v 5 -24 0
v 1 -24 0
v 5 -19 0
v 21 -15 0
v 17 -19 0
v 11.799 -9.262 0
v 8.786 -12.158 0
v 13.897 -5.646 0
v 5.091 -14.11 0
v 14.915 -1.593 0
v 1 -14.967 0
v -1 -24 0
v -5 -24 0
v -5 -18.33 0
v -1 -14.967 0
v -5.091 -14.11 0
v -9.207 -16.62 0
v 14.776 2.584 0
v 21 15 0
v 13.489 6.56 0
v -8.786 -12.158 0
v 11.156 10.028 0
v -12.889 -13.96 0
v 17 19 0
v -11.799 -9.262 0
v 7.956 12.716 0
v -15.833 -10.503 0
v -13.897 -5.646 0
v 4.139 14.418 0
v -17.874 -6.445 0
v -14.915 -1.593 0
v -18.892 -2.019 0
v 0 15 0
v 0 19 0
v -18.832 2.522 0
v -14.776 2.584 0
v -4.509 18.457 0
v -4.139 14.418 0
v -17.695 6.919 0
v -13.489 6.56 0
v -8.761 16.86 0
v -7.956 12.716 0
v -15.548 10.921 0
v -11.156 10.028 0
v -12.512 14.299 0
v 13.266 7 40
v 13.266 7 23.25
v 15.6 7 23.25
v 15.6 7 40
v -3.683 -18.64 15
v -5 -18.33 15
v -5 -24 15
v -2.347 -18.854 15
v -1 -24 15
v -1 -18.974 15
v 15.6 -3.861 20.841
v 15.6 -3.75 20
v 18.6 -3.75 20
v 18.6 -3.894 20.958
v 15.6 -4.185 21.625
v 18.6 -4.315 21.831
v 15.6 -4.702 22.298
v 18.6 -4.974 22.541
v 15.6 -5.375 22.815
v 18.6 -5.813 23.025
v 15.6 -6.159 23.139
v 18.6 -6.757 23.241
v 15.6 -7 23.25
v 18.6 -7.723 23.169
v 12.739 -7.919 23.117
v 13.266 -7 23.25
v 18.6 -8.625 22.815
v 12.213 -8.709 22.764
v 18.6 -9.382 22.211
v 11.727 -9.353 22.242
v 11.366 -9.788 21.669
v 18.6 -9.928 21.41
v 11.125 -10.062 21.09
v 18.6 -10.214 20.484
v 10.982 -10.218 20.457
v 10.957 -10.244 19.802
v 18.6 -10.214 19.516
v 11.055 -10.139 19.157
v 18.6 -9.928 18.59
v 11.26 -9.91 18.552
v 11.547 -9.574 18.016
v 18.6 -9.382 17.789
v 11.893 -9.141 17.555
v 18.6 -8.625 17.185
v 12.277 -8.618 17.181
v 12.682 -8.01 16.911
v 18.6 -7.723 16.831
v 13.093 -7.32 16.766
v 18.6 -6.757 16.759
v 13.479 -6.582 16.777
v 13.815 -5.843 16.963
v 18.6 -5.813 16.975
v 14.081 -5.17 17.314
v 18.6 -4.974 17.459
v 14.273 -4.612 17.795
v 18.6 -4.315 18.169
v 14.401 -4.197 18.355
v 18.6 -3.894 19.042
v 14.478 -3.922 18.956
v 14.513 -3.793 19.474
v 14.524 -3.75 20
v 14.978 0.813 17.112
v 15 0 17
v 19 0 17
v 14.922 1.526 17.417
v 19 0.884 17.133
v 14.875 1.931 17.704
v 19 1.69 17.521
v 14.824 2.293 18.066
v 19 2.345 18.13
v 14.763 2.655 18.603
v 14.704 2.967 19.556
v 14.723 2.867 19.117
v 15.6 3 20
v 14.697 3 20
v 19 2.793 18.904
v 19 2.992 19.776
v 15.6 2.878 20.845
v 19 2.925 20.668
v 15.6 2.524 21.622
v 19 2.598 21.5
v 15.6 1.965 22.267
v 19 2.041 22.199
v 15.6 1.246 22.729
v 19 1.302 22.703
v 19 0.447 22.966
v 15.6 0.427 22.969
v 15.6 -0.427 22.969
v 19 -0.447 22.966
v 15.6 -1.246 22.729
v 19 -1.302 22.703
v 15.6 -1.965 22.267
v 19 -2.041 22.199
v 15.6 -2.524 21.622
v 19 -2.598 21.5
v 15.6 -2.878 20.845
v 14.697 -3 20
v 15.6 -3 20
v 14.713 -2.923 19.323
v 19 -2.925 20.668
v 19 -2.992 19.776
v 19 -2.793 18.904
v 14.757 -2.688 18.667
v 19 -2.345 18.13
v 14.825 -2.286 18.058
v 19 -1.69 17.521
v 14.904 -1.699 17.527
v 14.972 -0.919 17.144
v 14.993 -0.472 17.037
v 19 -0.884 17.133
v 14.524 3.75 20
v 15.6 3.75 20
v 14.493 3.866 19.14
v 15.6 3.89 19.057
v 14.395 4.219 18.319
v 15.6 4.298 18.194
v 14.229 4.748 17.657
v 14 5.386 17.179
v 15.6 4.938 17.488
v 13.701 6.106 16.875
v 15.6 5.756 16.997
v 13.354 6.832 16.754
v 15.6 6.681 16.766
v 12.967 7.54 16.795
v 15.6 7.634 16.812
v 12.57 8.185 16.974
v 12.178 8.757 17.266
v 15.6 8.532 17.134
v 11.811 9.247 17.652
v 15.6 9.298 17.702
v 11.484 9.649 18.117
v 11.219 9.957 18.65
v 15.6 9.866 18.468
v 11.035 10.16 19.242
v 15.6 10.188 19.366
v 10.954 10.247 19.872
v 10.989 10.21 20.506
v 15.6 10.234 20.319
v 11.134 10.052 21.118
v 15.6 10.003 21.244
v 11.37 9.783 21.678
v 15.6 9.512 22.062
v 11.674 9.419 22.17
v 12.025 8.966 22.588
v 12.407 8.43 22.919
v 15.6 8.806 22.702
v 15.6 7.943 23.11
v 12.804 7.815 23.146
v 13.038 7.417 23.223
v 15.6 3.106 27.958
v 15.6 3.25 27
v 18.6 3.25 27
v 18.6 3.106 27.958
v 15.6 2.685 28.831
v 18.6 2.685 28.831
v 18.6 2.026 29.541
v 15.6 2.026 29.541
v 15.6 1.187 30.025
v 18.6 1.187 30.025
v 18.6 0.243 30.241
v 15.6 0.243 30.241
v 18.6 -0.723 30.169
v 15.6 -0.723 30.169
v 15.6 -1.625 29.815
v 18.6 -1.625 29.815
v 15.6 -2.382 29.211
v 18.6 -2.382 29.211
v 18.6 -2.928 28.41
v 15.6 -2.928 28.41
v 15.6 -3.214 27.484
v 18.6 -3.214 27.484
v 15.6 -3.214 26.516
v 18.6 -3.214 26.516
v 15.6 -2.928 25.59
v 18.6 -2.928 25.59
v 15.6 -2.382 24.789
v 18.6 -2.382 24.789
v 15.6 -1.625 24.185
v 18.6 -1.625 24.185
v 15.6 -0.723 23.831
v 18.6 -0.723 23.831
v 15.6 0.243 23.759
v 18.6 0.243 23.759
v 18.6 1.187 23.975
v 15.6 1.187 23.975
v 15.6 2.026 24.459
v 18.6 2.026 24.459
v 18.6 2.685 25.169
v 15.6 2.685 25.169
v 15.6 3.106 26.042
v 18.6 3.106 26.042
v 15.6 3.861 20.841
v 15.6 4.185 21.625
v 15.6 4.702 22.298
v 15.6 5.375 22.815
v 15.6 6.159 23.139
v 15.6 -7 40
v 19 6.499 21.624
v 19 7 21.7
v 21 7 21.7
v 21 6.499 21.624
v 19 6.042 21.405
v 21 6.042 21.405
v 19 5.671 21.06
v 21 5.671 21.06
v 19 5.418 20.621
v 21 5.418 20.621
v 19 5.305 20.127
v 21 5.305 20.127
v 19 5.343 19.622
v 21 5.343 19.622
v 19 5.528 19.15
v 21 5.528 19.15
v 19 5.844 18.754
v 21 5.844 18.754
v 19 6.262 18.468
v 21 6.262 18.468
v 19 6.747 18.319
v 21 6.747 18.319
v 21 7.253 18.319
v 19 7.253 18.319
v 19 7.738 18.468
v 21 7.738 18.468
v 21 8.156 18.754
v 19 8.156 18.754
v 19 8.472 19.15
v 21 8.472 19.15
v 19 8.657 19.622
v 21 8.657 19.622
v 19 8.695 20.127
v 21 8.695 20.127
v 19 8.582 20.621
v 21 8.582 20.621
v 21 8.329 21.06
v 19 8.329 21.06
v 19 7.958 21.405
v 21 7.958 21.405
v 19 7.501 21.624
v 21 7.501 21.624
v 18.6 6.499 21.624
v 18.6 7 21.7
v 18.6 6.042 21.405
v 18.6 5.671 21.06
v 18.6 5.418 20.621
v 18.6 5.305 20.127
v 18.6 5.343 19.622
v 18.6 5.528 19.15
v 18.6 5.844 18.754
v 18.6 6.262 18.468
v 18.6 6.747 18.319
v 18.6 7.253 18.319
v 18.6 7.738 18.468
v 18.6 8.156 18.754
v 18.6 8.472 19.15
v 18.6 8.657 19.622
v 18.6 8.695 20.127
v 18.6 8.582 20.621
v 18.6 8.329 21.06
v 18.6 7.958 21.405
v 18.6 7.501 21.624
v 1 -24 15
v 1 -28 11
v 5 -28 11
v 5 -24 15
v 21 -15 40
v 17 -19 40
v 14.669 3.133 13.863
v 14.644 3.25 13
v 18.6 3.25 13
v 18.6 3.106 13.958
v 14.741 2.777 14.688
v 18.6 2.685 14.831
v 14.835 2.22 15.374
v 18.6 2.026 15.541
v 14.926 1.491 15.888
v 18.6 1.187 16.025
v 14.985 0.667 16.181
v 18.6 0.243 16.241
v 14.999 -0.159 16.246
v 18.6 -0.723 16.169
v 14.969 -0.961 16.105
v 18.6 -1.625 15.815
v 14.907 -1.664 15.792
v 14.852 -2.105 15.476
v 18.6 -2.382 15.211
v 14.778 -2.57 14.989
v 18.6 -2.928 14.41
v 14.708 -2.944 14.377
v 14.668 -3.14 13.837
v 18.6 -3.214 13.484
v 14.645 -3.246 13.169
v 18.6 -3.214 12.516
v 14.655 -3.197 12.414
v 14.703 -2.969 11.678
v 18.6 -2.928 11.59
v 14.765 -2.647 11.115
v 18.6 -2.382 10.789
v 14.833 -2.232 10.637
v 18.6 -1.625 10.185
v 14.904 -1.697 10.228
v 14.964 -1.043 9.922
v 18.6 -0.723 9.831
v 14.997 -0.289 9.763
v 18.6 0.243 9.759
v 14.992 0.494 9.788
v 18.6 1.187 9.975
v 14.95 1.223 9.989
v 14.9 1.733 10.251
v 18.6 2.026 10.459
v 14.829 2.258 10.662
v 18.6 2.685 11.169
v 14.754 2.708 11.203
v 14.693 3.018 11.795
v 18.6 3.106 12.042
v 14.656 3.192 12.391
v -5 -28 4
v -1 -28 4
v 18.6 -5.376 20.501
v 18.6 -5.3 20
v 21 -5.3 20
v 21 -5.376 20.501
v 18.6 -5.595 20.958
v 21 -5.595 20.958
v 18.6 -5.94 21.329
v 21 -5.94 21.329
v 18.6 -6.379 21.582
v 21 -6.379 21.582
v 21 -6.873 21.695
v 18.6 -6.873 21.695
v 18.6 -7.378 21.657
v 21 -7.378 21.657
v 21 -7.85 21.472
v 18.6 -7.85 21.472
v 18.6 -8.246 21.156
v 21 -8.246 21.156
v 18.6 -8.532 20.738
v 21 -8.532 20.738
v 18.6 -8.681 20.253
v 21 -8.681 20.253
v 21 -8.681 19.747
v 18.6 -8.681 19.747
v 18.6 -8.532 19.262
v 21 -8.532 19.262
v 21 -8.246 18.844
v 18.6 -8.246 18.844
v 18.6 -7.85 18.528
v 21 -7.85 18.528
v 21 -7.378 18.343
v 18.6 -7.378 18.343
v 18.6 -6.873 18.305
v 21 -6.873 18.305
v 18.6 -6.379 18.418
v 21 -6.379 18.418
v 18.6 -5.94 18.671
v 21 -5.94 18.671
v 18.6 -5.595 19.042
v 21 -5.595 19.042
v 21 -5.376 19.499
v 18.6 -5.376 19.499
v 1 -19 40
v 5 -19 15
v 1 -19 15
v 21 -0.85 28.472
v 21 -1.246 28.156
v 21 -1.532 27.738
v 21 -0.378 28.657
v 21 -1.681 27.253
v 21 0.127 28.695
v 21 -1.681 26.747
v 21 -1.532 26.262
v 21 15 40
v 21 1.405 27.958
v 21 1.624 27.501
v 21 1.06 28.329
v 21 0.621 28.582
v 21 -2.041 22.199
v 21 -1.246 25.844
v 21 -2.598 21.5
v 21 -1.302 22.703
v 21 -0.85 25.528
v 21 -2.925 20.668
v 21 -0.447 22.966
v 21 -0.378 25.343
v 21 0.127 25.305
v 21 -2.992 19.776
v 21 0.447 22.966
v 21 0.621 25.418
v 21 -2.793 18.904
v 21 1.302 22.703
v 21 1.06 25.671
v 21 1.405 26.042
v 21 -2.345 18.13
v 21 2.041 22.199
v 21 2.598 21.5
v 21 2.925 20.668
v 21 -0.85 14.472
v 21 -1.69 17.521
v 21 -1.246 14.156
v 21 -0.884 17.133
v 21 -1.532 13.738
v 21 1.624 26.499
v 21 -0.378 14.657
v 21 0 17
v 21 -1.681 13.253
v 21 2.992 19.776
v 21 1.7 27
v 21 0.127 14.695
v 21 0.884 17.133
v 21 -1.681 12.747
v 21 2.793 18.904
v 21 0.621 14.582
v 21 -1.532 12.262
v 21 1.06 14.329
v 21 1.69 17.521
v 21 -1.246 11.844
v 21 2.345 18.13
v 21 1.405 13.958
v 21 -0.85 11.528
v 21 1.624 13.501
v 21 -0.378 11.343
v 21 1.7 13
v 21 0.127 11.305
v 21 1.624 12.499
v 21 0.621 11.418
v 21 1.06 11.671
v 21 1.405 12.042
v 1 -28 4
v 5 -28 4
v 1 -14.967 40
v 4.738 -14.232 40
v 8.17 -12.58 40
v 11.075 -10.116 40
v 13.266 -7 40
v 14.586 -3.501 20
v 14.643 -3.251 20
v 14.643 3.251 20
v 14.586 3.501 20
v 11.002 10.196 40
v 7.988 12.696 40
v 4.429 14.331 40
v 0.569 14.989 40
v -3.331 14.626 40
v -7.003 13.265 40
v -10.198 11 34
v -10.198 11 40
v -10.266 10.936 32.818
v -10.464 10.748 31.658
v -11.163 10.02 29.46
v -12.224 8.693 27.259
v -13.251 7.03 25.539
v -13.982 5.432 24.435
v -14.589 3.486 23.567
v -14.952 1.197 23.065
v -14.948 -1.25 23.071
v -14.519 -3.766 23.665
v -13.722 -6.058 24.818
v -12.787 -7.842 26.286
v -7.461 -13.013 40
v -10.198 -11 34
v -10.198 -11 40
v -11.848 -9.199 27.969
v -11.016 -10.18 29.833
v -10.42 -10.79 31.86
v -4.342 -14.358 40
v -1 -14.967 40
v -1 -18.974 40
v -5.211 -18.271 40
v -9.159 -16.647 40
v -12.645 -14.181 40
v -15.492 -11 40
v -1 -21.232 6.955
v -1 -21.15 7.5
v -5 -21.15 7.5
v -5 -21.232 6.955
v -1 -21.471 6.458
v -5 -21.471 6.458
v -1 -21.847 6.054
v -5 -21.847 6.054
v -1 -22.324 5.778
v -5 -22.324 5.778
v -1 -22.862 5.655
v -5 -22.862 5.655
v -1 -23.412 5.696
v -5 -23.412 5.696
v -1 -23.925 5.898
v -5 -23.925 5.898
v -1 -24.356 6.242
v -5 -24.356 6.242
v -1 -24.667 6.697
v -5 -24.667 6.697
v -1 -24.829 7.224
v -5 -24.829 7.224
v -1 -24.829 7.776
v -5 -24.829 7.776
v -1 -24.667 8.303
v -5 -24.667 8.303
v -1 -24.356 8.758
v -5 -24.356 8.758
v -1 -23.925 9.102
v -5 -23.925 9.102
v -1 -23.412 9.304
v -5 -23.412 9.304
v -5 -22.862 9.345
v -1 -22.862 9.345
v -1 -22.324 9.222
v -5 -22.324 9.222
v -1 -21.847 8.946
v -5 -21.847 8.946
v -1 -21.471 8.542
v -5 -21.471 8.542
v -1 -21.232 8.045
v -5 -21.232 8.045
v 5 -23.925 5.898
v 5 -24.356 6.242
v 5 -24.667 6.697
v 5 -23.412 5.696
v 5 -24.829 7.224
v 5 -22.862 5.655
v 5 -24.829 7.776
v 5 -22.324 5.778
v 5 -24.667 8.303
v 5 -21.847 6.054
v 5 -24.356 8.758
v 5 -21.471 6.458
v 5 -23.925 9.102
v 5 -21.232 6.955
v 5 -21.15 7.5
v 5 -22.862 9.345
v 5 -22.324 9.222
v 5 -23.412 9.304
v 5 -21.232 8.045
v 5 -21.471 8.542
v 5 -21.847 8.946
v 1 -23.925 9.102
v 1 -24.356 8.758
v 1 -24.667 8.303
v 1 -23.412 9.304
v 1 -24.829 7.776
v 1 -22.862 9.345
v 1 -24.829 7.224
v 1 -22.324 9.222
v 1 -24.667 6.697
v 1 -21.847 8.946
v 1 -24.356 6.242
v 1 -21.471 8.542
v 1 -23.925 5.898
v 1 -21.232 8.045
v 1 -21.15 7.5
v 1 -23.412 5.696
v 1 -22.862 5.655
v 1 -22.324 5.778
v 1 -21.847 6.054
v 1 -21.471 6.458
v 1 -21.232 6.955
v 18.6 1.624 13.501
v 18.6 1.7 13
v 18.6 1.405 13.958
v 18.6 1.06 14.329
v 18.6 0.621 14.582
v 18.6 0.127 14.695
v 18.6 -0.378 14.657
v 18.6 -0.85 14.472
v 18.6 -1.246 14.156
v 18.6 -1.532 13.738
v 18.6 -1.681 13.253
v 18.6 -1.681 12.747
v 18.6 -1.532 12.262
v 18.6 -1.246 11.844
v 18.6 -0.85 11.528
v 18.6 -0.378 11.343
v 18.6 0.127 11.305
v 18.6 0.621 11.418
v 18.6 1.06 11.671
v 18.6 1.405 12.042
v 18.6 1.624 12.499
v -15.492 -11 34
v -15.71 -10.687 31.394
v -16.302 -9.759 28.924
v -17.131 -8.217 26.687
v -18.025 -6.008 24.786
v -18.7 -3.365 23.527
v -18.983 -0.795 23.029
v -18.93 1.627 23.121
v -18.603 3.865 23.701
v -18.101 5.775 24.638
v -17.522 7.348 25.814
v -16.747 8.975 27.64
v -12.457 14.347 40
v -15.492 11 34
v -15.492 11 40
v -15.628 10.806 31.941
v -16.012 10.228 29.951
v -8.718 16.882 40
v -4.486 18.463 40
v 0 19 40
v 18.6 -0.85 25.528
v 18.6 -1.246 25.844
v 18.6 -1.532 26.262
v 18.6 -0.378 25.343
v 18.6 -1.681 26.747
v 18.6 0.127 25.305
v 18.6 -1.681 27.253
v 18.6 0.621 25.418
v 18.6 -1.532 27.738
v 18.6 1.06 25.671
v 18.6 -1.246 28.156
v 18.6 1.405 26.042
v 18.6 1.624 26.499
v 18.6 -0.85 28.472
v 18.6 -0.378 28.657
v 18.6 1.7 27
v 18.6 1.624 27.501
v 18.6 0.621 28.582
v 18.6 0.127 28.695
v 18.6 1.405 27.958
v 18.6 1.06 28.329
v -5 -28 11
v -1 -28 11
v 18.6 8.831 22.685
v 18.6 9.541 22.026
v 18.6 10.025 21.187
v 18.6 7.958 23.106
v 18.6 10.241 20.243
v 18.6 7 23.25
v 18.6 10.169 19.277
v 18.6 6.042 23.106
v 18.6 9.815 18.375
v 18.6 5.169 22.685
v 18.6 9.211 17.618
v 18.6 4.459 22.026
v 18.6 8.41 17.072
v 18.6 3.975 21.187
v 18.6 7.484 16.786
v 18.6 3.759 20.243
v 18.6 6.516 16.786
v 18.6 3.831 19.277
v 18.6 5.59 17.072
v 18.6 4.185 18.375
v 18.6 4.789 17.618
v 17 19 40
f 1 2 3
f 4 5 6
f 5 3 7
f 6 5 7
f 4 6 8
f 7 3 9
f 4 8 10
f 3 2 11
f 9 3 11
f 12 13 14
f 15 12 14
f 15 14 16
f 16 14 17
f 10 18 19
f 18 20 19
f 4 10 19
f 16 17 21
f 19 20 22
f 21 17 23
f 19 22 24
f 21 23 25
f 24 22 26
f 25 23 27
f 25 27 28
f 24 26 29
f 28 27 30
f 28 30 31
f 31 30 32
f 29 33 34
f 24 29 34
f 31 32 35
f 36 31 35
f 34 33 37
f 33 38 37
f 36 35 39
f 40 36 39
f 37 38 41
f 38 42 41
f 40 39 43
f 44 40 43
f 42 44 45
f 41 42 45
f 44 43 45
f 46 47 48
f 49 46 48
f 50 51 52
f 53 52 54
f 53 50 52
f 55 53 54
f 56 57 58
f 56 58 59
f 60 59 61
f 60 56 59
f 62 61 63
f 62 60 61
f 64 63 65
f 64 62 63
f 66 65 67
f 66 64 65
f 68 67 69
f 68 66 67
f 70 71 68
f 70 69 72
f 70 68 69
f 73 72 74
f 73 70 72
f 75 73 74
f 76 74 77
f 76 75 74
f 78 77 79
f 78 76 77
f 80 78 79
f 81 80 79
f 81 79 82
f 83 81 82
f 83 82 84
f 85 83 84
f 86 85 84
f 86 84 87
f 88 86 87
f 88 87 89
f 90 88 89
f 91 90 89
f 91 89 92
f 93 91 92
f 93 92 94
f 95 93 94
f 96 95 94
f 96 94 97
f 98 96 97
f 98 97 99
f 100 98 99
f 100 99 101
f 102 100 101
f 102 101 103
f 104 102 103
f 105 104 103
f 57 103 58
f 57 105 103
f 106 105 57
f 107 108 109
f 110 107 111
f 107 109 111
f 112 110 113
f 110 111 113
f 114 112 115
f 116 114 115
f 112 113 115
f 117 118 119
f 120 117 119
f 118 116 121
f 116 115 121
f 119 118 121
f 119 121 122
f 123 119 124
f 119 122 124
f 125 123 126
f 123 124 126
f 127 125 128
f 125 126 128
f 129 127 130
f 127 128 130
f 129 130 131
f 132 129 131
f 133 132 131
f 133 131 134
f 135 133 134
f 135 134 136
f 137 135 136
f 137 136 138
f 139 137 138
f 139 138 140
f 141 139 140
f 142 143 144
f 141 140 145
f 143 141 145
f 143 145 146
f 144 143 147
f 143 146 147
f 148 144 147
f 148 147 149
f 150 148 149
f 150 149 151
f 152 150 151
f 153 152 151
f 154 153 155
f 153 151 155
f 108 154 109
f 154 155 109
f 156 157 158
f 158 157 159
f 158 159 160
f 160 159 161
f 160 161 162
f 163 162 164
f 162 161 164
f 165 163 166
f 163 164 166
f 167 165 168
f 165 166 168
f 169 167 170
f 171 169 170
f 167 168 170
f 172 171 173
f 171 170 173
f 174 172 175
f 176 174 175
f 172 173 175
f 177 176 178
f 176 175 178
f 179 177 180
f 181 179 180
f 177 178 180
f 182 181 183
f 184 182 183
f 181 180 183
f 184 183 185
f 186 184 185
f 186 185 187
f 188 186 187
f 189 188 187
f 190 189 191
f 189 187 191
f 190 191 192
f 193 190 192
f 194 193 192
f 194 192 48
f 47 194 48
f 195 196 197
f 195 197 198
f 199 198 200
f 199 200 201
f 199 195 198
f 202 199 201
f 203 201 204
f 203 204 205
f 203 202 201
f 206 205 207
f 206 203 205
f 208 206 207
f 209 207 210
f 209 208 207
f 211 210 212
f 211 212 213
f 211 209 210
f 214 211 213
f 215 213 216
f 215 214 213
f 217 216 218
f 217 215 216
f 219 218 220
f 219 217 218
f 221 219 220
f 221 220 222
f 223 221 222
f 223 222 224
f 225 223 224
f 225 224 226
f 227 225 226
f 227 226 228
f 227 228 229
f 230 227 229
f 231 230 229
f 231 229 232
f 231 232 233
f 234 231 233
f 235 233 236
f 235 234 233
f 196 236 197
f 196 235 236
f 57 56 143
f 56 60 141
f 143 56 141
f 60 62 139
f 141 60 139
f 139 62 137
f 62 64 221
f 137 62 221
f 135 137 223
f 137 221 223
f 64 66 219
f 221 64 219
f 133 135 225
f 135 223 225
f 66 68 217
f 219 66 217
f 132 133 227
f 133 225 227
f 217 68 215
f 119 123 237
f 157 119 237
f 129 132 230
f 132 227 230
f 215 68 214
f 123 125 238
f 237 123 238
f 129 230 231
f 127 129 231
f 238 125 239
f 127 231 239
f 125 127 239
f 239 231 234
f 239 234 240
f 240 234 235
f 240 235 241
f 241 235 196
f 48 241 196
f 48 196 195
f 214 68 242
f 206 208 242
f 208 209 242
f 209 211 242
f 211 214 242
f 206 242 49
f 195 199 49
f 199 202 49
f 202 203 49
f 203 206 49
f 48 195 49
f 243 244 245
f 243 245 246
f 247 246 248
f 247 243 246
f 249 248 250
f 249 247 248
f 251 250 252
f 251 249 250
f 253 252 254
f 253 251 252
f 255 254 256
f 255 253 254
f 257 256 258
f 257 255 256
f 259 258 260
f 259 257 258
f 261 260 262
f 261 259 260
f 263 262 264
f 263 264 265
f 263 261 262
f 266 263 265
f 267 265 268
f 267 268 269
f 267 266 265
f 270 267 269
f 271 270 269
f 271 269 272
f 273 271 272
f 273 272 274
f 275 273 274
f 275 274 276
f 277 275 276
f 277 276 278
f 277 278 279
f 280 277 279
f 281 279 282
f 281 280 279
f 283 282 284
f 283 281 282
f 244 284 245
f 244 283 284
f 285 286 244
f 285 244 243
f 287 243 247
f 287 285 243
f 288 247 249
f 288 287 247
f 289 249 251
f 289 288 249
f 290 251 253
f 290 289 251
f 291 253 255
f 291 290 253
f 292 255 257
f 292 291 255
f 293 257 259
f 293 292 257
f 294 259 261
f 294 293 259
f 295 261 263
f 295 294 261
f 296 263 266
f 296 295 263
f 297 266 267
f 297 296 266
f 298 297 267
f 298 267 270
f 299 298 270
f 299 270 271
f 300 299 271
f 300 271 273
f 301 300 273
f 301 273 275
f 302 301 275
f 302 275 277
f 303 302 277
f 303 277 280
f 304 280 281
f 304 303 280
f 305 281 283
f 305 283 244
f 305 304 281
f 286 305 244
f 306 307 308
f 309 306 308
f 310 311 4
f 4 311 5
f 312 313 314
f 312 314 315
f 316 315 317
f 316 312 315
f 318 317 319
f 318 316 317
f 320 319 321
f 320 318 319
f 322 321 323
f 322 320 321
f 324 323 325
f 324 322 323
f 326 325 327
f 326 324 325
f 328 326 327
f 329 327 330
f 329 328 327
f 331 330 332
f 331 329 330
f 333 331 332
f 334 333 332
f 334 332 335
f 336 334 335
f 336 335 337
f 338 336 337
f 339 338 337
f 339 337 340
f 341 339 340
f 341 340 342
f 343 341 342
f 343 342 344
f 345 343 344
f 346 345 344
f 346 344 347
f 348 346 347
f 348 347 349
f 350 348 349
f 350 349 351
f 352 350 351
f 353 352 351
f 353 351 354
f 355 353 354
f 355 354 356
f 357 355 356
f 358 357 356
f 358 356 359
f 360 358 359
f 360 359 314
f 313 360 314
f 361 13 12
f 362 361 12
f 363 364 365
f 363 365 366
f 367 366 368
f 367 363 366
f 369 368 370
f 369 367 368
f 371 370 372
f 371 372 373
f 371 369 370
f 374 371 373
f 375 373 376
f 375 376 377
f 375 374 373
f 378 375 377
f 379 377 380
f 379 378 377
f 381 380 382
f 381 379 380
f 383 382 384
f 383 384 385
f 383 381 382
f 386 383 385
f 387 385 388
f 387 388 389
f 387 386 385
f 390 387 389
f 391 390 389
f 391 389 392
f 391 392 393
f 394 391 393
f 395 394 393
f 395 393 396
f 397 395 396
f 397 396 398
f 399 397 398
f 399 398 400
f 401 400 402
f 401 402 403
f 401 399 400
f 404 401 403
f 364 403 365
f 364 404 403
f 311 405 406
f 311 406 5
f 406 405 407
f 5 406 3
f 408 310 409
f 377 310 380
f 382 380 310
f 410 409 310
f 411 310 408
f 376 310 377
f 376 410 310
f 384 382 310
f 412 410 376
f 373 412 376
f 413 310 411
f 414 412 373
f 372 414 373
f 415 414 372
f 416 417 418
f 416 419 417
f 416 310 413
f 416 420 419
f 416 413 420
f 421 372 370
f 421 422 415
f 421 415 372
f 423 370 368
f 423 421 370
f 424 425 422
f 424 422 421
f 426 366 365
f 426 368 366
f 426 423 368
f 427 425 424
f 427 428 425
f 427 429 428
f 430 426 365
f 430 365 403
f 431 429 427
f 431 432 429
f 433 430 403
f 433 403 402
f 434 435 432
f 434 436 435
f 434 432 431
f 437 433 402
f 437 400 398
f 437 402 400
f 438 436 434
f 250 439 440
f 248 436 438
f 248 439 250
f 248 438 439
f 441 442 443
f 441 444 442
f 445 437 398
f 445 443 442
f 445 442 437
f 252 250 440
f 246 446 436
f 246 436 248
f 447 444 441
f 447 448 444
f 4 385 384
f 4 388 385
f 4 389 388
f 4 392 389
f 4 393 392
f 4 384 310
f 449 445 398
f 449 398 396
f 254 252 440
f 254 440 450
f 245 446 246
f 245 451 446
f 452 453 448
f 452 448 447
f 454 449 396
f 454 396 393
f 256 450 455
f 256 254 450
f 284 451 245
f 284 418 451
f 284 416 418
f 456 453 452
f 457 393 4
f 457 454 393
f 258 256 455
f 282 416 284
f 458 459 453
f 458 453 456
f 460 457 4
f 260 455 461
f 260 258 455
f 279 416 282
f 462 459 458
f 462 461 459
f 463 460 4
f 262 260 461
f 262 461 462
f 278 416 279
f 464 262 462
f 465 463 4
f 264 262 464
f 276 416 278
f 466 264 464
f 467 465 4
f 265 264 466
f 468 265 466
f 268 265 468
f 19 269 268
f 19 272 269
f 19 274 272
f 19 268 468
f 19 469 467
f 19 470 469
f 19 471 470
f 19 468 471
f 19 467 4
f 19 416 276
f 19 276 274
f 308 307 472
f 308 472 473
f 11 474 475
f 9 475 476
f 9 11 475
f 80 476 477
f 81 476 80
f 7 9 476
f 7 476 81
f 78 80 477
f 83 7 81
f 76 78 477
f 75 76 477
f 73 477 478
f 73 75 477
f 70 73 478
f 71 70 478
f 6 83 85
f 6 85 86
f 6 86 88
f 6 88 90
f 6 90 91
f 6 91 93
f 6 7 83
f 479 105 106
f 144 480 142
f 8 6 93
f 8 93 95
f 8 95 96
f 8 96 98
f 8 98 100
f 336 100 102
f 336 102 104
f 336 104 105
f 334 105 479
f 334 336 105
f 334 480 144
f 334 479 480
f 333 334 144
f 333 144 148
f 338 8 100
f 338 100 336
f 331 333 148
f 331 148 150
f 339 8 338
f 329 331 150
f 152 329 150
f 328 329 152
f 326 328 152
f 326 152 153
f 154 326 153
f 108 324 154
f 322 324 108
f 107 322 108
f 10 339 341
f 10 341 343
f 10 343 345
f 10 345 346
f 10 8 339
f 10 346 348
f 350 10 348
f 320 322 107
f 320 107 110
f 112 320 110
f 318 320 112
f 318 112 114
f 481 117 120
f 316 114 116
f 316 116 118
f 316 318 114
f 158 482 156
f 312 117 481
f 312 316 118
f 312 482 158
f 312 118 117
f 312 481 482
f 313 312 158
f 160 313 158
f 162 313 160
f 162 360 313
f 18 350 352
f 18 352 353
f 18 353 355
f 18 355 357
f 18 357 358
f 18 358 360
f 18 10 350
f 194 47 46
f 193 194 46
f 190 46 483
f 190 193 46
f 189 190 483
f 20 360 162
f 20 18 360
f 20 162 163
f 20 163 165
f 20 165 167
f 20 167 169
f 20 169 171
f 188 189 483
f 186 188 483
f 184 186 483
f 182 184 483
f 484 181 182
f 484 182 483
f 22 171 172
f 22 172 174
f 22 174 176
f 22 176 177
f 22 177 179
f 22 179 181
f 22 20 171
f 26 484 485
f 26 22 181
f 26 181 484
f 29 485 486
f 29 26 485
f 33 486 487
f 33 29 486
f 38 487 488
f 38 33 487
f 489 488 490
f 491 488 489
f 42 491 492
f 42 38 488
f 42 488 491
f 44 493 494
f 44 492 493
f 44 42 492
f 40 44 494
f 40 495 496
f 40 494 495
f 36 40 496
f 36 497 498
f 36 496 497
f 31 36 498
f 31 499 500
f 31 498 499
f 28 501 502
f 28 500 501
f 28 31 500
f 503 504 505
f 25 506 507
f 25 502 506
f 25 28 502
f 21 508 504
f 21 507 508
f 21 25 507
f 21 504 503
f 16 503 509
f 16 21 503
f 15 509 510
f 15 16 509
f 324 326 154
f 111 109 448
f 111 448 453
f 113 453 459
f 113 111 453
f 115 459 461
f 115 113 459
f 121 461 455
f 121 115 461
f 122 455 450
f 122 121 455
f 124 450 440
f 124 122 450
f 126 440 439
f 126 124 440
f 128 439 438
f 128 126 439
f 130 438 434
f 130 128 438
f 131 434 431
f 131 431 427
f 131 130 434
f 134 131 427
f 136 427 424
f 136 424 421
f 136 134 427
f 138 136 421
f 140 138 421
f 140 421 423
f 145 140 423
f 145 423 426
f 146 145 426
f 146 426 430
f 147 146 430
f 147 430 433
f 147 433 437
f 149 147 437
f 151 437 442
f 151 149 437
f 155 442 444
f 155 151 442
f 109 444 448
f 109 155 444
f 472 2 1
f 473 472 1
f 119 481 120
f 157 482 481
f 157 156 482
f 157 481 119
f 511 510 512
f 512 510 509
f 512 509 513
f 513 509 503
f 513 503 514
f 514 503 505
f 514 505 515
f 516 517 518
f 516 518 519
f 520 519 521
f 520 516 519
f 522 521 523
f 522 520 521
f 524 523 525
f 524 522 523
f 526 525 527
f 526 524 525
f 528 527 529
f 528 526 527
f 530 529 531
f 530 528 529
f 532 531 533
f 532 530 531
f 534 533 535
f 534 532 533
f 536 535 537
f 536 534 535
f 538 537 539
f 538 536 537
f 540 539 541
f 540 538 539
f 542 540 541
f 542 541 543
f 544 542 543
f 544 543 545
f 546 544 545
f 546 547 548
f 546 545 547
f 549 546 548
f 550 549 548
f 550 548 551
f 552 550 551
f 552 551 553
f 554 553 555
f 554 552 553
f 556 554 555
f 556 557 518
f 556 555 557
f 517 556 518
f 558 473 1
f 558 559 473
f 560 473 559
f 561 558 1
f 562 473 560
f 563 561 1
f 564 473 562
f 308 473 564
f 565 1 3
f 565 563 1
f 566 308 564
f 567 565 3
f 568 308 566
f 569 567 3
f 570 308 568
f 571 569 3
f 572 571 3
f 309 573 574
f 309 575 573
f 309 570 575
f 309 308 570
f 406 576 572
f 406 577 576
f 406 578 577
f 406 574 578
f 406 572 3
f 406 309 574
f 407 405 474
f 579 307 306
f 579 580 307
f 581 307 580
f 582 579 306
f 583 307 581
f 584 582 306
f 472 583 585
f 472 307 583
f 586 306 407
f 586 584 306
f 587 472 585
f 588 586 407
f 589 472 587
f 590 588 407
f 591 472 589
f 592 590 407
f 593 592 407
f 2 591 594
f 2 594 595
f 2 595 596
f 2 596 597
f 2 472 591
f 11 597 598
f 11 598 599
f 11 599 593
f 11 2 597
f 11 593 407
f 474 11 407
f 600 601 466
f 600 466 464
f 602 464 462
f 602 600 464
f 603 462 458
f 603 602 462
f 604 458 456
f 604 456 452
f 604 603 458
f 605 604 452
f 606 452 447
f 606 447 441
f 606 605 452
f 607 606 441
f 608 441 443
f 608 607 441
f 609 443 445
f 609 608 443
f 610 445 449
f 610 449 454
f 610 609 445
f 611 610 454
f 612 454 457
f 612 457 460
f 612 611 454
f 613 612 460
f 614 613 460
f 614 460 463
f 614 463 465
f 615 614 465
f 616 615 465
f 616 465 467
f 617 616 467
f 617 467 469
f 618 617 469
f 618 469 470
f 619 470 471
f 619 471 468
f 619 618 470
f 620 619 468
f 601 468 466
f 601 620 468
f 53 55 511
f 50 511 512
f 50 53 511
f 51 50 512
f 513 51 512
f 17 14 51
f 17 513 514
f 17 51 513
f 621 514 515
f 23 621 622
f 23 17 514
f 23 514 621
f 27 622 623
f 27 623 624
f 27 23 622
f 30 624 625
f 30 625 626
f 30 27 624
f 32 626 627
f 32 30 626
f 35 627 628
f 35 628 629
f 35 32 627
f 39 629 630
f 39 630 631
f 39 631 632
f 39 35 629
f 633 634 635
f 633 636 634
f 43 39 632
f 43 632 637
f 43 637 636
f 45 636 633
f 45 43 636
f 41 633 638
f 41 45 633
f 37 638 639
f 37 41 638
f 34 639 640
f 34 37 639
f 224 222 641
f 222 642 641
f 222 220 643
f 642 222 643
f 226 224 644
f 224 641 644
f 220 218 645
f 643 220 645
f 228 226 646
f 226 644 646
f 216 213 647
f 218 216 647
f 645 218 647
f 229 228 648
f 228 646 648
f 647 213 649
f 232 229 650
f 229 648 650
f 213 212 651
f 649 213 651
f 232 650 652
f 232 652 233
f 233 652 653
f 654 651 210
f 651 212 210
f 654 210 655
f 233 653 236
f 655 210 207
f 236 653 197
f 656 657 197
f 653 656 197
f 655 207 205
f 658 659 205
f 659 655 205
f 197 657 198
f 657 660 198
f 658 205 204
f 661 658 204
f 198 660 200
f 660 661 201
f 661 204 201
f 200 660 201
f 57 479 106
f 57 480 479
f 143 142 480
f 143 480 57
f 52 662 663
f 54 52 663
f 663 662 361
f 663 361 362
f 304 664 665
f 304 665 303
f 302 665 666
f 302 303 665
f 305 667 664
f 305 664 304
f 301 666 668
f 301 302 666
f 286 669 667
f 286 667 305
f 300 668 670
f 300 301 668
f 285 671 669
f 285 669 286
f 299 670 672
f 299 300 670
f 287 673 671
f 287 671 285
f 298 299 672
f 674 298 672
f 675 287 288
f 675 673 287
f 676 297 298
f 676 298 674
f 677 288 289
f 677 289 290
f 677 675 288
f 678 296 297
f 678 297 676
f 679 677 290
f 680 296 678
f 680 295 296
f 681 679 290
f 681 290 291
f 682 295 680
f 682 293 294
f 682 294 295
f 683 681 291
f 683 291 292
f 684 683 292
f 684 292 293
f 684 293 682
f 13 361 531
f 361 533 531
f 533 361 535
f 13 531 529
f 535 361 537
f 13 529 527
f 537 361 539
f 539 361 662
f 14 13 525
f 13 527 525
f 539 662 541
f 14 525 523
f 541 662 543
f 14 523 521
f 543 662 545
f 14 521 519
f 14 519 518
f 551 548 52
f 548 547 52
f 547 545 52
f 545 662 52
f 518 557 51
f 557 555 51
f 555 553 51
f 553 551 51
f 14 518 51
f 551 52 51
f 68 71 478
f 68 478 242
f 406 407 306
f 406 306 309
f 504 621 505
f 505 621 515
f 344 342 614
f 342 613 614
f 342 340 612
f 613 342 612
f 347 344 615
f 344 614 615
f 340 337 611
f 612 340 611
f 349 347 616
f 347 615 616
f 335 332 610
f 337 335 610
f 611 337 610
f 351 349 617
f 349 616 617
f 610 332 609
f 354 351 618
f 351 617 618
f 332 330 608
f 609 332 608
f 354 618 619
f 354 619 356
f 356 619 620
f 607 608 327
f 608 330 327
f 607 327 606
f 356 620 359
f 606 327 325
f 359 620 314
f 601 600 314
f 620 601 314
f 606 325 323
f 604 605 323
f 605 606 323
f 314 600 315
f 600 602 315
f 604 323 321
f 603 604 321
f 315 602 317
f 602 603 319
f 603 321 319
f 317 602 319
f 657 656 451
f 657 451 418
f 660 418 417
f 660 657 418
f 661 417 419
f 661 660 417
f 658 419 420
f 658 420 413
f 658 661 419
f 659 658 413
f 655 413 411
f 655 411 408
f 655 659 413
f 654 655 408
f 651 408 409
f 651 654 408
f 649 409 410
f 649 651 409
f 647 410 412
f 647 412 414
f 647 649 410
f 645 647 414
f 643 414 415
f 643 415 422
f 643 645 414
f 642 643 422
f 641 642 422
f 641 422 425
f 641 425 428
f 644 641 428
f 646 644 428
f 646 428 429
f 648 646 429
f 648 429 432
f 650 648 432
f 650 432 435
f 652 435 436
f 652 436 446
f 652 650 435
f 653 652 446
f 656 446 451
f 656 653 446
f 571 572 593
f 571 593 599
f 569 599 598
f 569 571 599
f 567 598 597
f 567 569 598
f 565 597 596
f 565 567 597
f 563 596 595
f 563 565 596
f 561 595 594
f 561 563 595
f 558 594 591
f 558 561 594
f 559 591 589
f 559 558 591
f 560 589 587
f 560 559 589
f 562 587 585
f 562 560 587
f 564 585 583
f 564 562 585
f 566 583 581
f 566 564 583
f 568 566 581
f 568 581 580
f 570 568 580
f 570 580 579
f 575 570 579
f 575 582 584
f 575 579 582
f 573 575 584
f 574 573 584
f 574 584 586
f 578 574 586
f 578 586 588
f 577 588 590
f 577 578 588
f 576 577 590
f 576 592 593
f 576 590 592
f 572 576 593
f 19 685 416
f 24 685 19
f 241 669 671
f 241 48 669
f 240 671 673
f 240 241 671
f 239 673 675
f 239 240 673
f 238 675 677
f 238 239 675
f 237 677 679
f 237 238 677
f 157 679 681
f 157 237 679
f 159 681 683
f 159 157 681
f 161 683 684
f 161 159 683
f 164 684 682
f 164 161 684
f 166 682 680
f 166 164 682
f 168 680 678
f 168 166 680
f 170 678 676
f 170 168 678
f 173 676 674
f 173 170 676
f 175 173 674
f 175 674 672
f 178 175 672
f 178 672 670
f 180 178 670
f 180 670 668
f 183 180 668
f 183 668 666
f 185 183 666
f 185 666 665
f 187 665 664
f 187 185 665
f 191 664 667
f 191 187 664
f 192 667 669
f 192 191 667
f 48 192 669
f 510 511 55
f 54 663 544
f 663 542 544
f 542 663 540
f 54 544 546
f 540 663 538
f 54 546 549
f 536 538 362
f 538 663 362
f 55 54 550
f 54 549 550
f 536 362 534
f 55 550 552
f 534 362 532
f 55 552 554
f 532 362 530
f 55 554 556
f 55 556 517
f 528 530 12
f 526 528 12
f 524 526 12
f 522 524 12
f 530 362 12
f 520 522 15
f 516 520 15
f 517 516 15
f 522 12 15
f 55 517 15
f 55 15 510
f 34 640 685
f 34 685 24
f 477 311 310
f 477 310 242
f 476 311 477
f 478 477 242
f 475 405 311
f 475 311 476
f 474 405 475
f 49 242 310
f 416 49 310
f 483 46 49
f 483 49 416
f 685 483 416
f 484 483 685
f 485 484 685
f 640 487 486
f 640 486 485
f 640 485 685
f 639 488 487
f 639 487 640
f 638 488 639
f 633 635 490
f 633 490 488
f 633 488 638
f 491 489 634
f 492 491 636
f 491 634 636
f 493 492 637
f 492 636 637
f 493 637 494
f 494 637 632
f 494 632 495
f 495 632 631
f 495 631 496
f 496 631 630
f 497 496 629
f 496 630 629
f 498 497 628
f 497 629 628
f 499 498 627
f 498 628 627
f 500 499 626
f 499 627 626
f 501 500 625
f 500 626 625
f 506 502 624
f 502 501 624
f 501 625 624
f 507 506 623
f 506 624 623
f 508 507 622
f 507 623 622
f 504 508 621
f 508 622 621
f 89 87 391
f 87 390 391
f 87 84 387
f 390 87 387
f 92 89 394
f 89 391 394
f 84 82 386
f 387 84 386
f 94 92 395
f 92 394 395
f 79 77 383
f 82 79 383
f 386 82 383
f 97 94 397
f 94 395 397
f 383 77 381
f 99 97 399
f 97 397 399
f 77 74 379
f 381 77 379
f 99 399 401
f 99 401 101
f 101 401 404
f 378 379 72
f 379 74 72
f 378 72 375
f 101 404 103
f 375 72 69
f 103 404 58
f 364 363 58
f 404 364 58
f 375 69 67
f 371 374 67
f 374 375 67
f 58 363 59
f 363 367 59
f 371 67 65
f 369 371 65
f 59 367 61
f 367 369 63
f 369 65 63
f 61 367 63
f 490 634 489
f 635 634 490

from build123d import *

# Parameters (mm, degrees)
BOSS_EXTRUDE1_DEPTH      = 40
EXTRUDE_START            = -25
SKETCH_5_W               = 10
SKETCH_5_H               = 28
EXTRUDE_2_DEPTH          = 15
CUT_EXTRUDE1_DEPTH       = 53.39274759
CUT_EXTRUDE1_DEPTH_BACK  = 53.39274759
SKETCH2_R                = 15
SKETCH5_R                = 11
CUT_EXTRUDE3_DEPTH       = 10
SKETCH7_W                = 6.152946469
SKETCH7_H                = 22
CUT_EXTRUDE9_DEPTH       = 10
SKETCH_2_W               = 5
SKETCH_2_H               = 14
CUT_EXTRUDE_2_DEPTH      = 20
CUT_EXTRUDE_6_DEPTH      = 51.368641203
CUT_EXTRUDE_6_DEPTH_BACK = 51.368641203
SKETCH_7_R               = 1.85
SKETCH6_W                = 2
SKETCH6_H                = 28
CUT_EXTRUDE8_DEPTH       = 53.392747702
CUT_EXTRUDE10_REACH      = 63.871
SKETCH8_R                = 3
CUT_EXTRUDE11_REACH      = 61.843
SKETCH13_R               = 3.25
SKETCH14_W               = 40
SKETCH14_H               = 38
SKETCH14_R               = 3
SKETCH14_R_2             = 1.7
BOSS_EXTRUDE2_DEPTH      = 2
CIRPATTERN1_START        = 10
CIRPATTERN1_OUTLINE_R    = 3.25
CIRPATTERN1_DEPTH        = 8.6
CIRPATTERN1_START_2      = 18.6
CIRPATTERN1_2_OUTLINE_R  = 1.7
CIRPATTERN1_2_DEPTH      = 2.4
CIRPATTERN2_START        = 15.6
CIRPATTERN2_OUTLINE_R    = 3.25
CIRPATTERN2_DEPTH        = 3
CIRPATTERN2_START_2      = 18.6
CIRPATTERN2_2_OUTLINE_R  = 1.7
CIRPATTERN2_2_DEPTH      = 2.4
CHAMFER1_SIZE            = 4


with BuildPart() as part:
    # Sketch1 → Boss-Extrude1 (new body)
    with BuildSketch(Plane.XY):
        with BuildLine():
            Line((0, 19), (19, 19))
            Line((19, 19), (19, -19))
            Line((19, -19), (0, -19))
            ThreePointArc((0, -19), (-19, 0), (0, 19))
        make_face()
    extrude(amount=BOSS_EXTRUDE1_DEPTH)

    # 草圖5 → 填料-伸長2 (add)
    with BuildSketch(Plane.XY.offset(40).offset(EXTRUDE_START)):
        with Locations((0, -14)):
            Rectangle(SKETCH_5_W, SKETCH_5_H)
    extrude(amount=-EXTRUDE_2_DEPTH)

    # Sketch2 → Cut-Extrude1 (cut, two sides: drawn at the far end of the back side and taken through both)
    with BuildSketch(Plane.XY.offset(40).offset(-CUT_EXTRUDE1_DEPTH_BACK)):
        Circle(SKETCH2_R)
    extrude(amount=CUT_EXTRUDE1_DEPTH + CUT_EXTRUDE1_DEPTH_BACK, mode=Mode.SUBTRACT)

    # Sketch5 → Cut-Extrude3 (cut)
    with BuildSketch(Plane(origin=(-19, 0, 0), x_dir=(0, 1, 0), z_dir=(-1, 0, 0))):
        with Locations((0, -34)):
            Circle(SKETCH5_R)
    extrude(amount=-CUT_EXTRUDE3_DEPTH, mode=Mode.SUBTRACT)

    # Sketch7 → Cut-Extrude9 (cut)
    with BuildSketch(Plane.ZY.offset(19)):
        with Locations((37.076473234, 0)):
            Rectangle(SKETCH7_W, SKETCH7_H)
    extrude(amount=-CUT_EXTRUDE9_DEPTH, mode=Mode.SUBTRACT)

    # 草圖2 → 除料-伸長2 (cut)
    with BuildSketch(Plane.XY.offset(40)):
        with Locations((13.1, 0)):
            Rectangle(SKETCH_2_W, SKETCH_2_H)
    extrude(amount=-CUT_EXTRUDE_2_DEPTH, mode=Mode.SUBTRACT)

    # 草圖7 → 除料-伸長6 (cut, two sides: drawn at the far end of the back side and taken through both)
    with BuildSketch(Plane(origin=(0, -5, 0), x_dir=(0, 0, 1), z_dir=(-1, 0, 0)).offset(-CUT_EXTRUDE_6_DEPTH_BACK)):
        with Locations(Location((7.5, -18, 0), (0, 0, 90))):
            Circle(SKETCH_7_R)
    extrude(amount=CUT_EXTRUDE_6_DEPTH + CUT_EXTRUDE_6_DEPTH_BACK, mode=Mode.SUBTRACT)

    # Sketch6 → Cut-Extrude8 (cut, through all)
    with BuildSketch(Plane.XY):
        with Locations((0, -14)):
            Rectangle(SKETCH6_W, SKETCH6_H)
    extrude(amount=CUT_EXTRUDE8_DEPTH, mode=Mode.SUBTRACT)

    # Sketch8 → Cut-Extrude10 (cut, up to next)
    with BuildSketch(Plane(origin=(19, 0, 0), x_dir=(0, 0, -1), z_dir=(1, 0, 0)), mode=Mode.PRIVATE) as cut_extrude10_sk1:
        with Locations((-20, 0)):
            Circle(SKETCH8_R)
    cut_extrude10_tool1 = extrude(cut_extrude10_sk1.sketch, amount=-CUT_EXTRUDE10_REACH, mode=Mode.PRIVATE) & part.part
    add(cut_extrude10_tool1.solids().sort_by_distance((19, 0, 20))[0], mode=Mode.SUBTRACT)

    # Sketch12 → CBORE for M3 SHCS1 (revolve, cut)
    with BuildSketch(Plane(origin=(15.6, 7, 20), x_dir=(0, 0, 1), z_dir=(0, 1, 0))):
        Polygon((0, 0), (0, 3.4), (1.7, 3.4), (1.7, 3), (3.25, 3), (3.25, 0), align=None)
    revolve(axis=Axis((9.25, 7, 20), (1, 0, 0)), mode=Mode.SUBTRACT)

    # Sketch13 → Cut-Extrude11 (cut, up to next)
    with BuildSketch(Plane(origin=(15.6, 0, 0), x_dir=(0, 0, -1), z_dir=(1, 0, 0)), mode=Mode.PRIVATE) as cut_extrude11_sk1:
        with Locations(Location((-20, 7, 0), (0, 0, 180))):
            Circle(SKETCH13_R)
    cut_extrude11_tool1 = extrude(cut_extrude11_sk1.sketch, amount=-CUT_EXTRUDE11_REACH, mode=Mode.PRIVATE) & part.part
    add(cut_extrude11_tool1.solids().sort_by_distance((15.6, 7, 20))[0], mode=Mode.SUBTRACT)

    # Sketch14 → Boss-Extrude2 (add)
    with BuildSketch(Plane(origin=(19, 0, 0), x_dir=(0, 0, -1), z_dir=(1, 0, 0))):
        with Locations((-20, 0)):
            Rectangle(SKETCH14_W, SKETCH14_H)
        with Locations((-20, 0)):
            Circle(SKETCH14_R, mode=Mode.SUBTRACT)
        with Locations(Location((-20, 7, 0), (0, 0, 180))):
            Circle(SKETCH14_R_2, mode=Mode.SUBTRACT)
    extrude(amount=BOSS_EXTRUDE2_DEPTH)

    # CirPattern1: read off the stored shape, not the designer's step
    # CirPattern1 outline → CirPattern1 (cut)
    with BuildSketch(Plane.YZ.offset(CIRPATTERN1_START)):
        with Locations((0, 13)):
            Circle(CIRPATTERN1_OUTLINE_R)
        with Locations((-7, 20)):
            Circle(CIRPATTERN1_OUTLINE_R)
    extrude(amount=CIRPATTERN1_DEPTH, mode=Mode.SUBTRACT)

    # CirPattern1 2 outline → CirPattern1 2 (cut)
    with BuildSketch(Plane.YZ.offset(CIRPATTERN1_START_2)):
        with Locations((0, 13)):
            Circle(CIRPATTERN1_2_OUTLINE_R)
        with Locations((-7, 20)):
            Circle(CIRPATTERN1_2_OUTLINE_R)
    extrude(amount=CIRPATTERN1_2_DEPTH, mode=Mode.SUBTRACT)

    # CirPattern2: read off the stored shape, not the designer's step
    # CirPattern2 outline → CirPattern2 (cut)
    with BuildSketch(Plane.YZ.offset(CIRPATTERN2_START)):
        with Locations((0, 27)):
            Circle(CIRPATTERN2_OUTLINE_R)
    extrude(amount=CIRPATTERN2_DEPTH, mode=Mode.SUBTRACT)

    # CirPattern2 2 outline → CirPattern2 2 (cut)
    with BuildSketch(Plane.YZ.offset(CIRPATTERN2_START_2)):
        with Locations((0, 27)):
            Circle(CIRPATTERN2_2_OUTLINE_R)
    extrude(amount=CIRPATTERN2_2_DEPTH, mode=Mode.SUBTRACT)

    # Chamfer1
    chamfer1_edges = [part.edges().sort_by_distance(p)[0] for p in [
        (21, -19, 20),
        (21, 19, 20),
        (-3, -28, 15),
        (-3, -28, 0),
        (3, -28, 15),
        (3, -28, 0),
    ]]
    chamfer(chamfer1_edges, length=CHAMFER1_SIZE)


solid = part.part
